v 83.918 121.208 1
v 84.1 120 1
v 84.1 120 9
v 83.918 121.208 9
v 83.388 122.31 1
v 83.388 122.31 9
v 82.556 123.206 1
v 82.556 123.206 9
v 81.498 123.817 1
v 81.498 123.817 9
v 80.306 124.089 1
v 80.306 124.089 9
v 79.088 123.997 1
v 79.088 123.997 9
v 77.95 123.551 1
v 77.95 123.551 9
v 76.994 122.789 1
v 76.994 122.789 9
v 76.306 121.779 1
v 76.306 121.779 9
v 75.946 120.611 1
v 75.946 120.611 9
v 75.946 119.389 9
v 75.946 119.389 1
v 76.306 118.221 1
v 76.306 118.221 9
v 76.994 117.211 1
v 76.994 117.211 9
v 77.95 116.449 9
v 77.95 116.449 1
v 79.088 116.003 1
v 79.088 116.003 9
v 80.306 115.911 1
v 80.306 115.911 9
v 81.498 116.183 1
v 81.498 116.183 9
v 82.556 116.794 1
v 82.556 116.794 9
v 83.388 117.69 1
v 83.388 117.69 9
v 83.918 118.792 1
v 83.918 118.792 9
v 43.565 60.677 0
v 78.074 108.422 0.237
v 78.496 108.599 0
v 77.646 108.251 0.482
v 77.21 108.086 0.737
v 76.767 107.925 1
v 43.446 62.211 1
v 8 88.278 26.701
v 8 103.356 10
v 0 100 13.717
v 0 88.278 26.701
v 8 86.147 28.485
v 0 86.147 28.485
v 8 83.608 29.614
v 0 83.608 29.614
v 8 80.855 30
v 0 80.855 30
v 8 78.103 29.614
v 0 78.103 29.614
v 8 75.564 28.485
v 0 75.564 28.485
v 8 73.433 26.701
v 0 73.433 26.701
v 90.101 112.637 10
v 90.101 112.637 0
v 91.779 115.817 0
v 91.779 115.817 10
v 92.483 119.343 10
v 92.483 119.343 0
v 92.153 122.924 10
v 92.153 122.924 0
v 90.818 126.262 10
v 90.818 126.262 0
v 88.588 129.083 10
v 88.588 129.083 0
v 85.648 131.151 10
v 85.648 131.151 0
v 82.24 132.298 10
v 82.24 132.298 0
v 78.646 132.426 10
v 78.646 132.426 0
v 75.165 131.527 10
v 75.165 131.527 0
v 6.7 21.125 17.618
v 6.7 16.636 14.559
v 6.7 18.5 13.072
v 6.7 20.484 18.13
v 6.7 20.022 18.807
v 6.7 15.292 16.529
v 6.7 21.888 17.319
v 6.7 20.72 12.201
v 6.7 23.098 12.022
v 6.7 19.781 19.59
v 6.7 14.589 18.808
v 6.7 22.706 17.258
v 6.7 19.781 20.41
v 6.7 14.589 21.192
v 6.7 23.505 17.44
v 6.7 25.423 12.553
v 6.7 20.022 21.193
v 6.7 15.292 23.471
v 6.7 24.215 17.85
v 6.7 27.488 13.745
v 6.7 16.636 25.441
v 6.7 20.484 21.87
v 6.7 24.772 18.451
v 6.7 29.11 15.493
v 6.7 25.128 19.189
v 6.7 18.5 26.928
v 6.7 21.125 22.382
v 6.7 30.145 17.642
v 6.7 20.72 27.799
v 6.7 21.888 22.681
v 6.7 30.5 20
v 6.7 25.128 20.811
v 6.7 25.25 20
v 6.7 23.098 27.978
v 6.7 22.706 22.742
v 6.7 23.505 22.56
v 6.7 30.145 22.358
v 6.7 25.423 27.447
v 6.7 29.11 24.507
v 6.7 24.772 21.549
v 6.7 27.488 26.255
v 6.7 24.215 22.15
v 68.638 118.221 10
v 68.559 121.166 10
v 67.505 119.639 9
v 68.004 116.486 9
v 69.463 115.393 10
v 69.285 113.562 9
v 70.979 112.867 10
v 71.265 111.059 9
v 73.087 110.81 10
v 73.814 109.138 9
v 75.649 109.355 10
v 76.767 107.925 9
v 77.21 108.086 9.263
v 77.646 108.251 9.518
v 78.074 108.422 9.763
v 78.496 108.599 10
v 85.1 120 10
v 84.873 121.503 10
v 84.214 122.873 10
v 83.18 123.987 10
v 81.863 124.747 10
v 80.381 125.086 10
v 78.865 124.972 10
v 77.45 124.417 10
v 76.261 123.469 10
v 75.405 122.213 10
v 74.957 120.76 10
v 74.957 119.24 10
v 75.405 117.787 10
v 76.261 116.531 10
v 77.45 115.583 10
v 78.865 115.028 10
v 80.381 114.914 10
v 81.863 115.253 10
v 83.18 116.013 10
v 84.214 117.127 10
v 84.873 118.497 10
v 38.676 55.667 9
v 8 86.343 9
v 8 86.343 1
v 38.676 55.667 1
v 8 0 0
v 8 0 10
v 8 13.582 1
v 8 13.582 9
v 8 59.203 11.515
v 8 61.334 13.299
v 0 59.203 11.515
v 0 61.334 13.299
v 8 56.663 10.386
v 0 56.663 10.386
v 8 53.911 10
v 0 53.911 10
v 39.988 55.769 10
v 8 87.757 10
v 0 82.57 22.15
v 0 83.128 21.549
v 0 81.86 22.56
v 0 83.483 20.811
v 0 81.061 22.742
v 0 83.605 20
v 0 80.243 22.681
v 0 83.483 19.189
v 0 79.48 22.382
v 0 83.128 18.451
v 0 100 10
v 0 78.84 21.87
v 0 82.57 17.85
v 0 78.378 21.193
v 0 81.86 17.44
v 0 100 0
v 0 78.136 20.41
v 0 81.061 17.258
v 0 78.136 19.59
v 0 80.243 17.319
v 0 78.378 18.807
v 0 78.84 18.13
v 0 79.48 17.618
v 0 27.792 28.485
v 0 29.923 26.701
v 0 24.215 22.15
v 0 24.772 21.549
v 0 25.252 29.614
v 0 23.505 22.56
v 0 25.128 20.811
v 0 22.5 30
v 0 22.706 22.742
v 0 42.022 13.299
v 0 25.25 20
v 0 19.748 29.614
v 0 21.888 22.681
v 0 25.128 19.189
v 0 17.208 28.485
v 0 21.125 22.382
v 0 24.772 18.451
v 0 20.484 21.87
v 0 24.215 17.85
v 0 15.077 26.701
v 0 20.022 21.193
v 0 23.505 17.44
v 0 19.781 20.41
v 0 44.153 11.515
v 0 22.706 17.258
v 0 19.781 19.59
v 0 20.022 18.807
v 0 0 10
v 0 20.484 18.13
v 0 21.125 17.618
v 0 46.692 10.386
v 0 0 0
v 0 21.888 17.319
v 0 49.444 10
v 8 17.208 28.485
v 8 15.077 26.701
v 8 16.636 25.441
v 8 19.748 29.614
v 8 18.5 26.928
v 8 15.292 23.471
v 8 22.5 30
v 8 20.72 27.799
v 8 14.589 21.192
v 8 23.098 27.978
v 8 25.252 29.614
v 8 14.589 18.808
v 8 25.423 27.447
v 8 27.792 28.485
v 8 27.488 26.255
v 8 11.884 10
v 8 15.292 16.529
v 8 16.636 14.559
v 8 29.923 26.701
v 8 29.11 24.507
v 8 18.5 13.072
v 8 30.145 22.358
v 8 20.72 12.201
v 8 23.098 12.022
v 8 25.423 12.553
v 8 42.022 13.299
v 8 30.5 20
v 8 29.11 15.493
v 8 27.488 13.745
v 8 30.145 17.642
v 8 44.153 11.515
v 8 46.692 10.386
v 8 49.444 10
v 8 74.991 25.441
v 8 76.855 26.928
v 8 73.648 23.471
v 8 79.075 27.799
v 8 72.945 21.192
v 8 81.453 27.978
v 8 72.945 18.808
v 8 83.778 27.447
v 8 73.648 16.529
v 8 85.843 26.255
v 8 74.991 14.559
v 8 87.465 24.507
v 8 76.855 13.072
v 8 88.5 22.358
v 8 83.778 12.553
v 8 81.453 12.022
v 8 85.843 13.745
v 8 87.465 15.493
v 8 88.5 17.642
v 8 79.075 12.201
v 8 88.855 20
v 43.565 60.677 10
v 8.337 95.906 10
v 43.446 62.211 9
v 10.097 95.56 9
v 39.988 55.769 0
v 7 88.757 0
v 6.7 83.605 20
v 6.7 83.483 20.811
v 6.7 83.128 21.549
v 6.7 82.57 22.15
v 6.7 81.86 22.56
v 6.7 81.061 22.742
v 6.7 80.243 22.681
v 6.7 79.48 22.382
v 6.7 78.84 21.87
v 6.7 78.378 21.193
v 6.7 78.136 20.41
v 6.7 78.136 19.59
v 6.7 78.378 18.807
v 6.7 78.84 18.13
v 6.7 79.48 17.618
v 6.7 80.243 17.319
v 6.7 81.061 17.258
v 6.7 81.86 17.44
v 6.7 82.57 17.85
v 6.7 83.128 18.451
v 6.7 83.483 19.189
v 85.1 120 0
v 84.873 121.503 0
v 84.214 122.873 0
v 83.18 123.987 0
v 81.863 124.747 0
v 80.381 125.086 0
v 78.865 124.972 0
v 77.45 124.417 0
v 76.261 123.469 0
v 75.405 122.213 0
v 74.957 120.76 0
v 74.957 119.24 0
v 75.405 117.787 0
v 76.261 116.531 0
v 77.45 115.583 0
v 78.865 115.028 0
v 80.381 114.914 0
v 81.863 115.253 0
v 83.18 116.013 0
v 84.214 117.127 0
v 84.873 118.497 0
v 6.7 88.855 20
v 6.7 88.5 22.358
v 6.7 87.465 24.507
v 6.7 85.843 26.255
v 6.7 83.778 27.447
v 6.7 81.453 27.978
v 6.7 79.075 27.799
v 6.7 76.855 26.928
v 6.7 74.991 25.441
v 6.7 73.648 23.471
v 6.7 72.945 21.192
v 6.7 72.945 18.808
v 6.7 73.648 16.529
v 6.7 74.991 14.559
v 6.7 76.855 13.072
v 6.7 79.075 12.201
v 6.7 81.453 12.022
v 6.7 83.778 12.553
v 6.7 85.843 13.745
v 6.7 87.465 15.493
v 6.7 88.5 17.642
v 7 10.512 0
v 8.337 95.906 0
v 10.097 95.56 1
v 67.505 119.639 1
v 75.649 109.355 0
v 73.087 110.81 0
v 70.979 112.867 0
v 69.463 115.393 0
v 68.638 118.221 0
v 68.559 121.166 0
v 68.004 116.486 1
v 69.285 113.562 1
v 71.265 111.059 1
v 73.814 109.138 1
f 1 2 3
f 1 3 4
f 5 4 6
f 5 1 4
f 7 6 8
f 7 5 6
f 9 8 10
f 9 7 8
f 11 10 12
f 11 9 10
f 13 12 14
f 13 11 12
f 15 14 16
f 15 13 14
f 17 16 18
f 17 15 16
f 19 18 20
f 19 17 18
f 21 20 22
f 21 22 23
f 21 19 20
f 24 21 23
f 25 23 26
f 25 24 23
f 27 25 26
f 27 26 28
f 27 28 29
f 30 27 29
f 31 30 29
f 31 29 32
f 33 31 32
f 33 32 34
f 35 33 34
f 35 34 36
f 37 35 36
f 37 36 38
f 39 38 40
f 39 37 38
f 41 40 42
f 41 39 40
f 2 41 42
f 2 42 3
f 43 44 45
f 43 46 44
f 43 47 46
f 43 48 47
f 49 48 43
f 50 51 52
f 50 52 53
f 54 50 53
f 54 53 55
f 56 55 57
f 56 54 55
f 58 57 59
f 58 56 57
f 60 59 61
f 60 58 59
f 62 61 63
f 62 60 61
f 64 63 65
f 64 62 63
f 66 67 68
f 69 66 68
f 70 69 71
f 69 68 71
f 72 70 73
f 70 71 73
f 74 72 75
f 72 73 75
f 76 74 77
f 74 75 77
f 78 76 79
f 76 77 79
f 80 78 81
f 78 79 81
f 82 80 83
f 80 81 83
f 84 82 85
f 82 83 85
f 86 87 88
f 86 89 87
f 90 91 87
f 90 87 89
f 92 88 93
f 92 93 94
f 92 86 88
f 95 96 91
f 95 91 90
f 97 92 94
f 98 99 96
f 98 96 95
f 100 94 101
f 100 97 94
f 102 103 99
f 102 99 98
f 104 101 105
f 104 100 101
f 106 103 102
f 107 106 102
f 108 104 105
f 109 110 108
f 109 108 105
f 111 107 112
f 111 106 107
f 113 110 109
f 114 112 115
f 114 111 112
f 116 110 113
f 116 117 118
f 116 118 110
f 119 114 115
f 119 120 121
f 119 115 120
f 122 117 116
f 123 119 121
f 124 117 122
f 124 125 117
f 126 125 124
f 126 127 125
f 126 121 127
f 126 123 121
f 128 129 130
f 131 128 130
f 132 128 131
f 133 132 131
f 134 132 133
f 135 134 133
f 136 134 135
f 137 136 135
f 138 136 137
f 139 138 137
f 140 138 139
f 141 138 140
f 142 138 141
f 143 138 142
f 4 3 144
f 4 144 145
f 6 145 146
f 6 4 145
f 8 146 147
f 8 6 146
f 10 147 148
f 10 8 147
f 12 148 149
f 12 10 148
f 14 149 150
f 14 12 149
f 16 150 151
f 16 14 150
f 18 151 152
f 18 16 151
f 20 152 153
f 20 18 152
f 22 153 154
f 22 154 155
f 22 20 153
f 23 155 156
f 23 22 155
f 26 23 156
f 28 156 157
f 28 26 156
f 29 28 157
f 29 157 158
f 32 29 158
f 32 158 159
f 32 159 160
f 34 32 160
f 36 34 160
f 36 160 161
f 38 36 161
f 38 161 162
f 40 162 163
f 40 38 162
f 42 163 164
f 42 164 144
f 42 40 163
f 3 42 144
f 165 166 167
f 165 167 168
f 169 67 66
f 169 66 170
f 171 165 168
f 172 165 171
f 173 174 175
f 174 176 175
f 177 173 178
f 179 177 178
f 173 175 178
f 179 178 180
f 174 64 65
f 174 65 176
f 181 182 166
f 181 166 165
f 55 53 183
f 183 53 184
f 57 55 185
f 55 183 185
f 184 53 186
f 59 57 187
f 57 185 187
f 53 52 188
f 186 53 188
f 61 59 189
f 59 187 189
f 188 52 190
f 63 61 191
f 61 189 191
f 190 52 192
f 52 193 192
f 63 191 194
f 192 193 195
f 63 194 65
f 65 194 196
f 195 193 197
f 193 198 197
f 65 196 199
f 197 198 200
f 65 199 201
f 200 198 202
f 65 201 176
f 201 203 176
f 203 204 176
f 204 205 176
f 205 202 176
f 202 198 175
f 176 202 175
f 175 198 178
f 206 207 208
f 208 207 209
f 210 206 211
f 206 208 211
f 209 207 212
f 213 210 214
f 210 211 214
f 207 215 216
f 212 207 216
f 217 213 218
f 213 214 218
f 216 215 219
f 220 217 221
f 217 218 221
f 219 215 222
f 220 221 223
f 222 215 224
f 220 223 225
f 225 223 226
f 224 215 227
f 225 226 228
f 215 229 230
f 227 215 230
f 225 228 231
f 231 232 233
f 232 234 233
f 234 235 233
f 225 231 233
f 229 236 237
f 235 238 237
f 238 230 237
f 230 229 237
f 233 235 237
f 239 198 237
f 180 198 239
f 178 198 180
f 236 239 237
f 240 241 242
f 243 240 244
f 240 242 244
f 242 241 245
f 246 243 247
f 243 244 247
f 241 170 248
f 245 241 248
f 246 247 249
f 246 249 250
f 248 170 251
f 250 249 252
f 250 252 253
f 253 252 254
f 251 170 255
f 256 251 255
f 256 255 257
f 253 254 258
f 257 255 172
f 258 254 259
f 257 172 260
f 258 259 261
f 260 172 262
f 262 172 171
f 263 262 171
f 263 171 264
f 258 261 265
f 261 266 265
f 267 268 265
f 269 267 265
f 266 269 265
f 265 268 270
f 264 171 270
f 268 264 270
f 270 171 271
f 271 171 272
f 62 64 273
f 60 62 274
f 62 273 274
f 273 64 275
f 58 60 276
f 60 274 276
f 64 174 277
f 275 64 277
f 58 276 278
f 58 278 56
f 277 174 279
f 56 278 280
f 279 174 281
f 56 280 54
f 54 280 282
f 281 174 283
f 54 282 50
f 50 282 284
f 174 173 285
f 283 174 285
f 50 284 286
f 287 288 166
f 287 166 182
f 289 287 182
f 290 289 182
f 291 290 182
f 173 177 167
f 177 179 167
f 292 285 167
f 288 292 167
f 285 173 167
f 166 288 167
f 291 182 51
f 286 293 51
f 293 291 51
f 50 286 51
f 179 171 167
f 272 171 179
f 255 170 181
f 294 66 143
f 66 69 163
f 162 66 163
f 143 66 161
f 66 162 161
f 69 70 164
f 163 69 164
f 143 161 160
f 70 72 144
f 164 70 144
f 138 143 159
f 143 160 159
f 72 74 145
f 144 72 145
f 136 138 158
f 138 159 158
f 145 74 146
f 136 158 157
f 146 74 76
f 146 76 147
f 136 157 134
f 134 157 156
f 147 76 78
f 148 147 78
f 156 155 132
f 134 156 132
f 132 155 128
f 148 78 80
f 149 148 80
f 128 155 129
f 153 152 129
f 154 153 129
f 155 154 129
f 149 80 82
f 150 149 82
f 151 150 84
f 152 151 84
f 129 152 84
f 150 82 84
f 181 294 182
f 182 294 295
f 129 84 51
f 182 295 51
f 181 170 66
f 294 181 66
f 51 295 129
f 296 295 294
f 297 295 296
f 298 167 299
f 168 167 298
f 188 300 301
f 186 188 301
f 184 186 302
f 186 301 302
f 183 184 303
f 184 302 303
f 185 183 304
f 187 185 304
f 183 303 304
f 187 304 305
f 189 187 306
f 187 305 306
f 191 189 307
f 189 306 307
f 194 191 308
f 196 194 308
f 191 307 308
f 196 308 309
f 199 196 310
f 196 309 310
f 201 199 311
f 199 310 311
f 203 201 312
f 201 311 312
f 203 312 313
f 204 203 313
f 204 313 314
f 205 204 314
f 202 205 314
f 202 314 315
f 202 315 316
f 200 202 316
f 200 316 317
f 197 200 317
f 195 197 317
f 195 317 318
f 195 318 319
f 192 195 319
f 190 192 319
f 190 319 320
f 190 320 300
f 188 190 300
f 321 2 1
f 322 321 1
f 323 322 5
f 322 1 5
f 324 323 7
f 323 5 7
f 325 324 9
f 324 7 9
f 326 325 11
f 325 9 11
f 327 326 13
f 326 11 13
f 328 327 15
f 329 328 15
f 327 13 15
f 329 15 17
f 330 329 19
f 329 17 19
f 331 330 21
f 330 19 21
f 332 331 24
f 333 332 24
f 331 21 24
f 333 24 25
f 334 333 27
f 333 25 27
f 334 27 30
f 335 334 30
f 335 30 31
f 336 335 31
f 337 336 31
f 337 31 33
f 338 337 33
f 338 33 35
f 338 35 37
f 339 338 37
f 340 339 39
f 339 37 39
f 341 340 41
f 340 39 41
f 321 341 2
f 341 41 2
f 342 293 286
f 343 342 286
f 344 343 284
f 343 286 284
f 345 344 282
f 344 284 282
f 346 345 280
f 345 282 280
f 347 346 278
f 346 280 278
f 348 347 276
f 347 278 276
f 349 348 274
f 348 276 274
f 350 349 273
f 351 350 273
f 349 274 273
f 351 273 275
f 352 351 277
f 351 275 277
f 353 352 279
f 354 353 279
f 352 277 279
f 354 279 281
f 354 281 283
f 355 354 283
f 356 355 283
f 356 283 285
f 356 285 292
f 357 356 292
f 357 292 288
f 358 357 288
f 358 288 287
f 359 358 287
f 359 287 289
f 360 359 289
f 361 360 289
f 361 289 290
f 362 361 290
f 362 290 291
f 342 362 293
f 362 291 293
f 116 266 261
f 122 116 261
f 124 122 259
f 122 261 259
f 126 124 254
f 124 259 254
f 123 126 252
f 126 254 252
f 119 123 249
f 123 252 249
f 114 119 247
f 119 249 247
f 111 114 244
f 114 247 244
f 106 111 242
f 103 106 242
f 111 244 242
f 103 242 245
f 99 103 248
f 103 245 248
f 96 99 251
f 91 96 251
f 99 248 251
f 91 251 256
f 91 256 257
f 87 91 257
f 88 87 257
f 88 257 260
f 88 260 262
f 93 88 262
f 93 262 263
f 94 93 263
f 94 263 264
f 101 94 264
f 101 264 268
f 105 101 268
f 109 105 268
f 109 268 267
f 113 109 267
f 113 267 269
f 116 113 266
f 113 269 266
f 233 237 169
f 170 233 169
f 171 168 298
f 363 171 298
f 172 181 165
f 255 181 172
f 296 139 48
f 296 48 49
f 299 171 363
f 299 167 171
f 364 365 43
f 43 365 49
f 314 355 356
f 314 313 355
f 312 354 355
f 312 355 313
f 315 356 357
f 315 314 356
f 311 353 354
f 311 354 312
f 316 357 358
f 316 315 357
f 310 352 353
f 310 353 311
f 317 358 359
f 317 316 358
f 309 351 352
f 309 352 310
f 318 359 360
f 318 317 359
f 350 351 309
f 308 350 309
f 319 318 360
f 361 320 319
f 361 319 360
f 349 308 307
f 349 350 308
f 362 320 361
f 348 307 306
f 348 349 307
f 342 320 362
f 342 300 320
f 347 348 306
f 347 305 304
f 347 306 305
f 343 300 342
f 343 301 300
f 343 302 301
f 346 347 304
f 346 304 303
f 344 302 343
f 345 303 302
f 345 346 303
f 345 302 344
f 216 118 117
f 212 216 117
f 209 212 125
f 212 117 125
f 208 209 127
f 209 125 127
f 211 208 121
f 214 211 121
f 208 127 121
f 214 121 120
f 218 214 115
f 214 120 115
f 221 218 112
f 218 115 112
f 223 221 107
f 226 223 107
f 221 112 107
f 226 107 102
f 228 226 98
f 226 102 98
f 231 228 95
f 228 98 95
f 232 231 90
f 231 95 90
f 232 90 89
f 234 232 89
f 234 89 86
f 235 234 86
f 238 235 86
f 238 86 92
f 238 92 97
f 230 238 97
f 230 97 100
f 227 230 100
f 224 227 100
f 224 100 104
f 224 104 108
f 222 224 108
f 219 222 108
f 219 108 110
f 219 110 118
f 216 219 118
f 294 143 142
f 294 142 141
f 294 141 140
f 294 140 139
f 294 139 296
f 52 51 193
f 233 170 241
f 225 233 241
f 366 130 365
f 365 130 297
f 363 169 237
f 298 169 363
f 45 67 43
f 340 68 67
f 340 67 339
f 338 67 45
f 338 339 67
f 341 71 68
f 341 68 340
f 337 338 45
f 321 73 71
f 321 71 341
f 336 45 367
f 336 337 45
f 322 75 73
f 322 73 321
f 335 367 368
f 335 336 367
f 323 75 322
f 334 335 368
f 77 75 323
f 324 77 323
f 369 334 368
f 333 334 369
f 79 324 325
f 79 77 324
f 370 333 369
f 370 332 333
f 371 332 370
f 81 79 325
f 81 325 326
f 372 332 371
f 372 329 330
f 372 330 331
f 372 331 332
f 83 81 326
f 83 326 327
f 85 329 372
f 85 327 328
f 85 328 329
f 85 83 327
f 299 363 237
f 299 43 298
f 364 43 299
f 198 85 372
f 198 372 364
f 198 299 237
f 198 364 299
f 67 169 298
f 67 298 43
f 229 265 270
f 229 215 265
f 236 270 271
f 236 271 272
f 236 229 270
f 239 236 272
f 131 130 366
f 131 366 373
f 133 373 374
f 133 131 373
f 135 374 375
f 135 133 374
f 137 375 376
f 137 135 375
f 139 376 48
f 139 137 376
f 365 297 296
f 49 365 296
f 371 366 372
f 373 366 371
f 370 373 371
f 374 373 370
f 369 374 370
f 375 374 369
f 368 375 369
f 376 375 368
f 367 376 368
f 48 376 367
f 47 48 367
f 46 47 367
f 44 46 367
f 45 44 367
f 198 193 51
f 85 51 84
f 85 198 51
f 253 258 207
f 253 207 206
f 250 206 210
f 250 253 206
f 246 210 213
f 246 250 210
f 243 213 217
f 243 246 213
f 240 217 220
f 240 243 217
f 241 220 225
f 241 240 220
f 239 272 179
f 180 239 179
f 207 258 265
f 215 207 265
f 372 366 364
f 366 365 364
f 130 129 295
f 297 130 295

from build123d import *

# Parameters (mm, degrees)
SKETCH_R        = 4.1
PAD_DEPTH       = 10
POCKET_DEPTH    = 10
PAD001_DEPTH    = 20
POCKET001_DEPTH = 10
CHAMFER_SIZE    = 1
CHAMFER001_SIZE = 1
SKETCH004_R     = 2.75
POCKET002_DEPTH = 8.001
SKETCH005_R     = 8
POCKET003_DEPTH = 1.3
FILLET_R        = 10


with BuildPart() as part:
    # Sketch → Pad (new body)
    with BuildSketch(Plane.XY):
        with BuildLine():
            Line((0, 0), (0, 100))
            Line((0, 100), (75.165103, 131.527089))
            ThreePointArc((90.101368, 112.637096), (89.805197, 127.752942), (75.165103, 131.527089))
            Line((90.101368, 112.637096), (8, 0))
            Line((8, 0), (0, 0))
        make_face()
        with Locations((80, 120)):
            Circle(SKETCH_R, mode=Mode.SUBTRACT)
    extrude(amount=PAD_DEPTH)

    # Sketch001 (on DatumPlane) → Pocket (cut)
    with BuildSketch(Plane.XY.offset(10)):
        Polygon((8, 13.581597), (8, 86.343146), (38.676131, 55.667014), align=None)
        with BuildLine():
            ThreePointArc((67.505213, 119.639023), (70.194803, 112.247058), (76.767254, 107.92526))
            Line((76.767254, 107.92526), (43.445969, 62.210885))
            Line((10.097006, 95.559849), (43.445969, 62.210885))
            Line((67.505213, 119.639023), (10.097006, 95.559849))
        make_face()
    extrude(amount=-POCKET_DEPTH, mode=Mode.SUBTRACT)

    # Sketch003 (on DatumPlane) → Pad001 (join)
    with BuildSketch(Plane.XY.offset(10)):
        Polygon((0, 100), (0, 0), (8, 0), (8, 103.355503), align=None)
    extrude(amount=PAD001_DEPTH)

    # Sketch002 (on DatumPlane) → Pocket001 (cut)
    with BuildSketch(Plane.YZ.offset(8)):
        with BuildLine():
            Line((0, 10), (15.077323, 26.70103))
            ThreePointArc((29.922685, 26.70103), (22.500004, 30), (15.077323, 26.70103))
            Line((29.922685, 26.70103), (45, 10))
            Line((45, 10), (58.355503, 10))
            Line((73.432722, 26.701024), (58.355503, 10))
            ThreePointArc((88.278096, 26.701024), (80.855409, 30), (73.432722, 26.701024))
            Line((103.355503, 10), (88.278096, 26.701024))
            Line((103.355503, 10), (128.355503, 10))
            Line((128.355503, 50), (128.355503, 10))
            Line((-25, 50), (128.355503, 50))
            Line((-25, 10), (-25, 50))
            Line((0, 10), (-25, 10))
        make_face()
    extrude(amount=-POCKET001_DEPTH, mode=Mode.SUBTRACT)

    # Chamfer
    chamfer_edges = [part.edges().sort_by_distance(p)[0] for p in [
        (75.9, 120, 10),
        (75.9, 120, 0),
    ]]
    chamfer(chamfer_edges, length=CHAMFER_SIZE)

    # Chamfer001
    chamfer001_edges = [part.edges().sort_by_distance(p)[0] for p in [
        (38.801109, 107.599436, 10),
        (70.194803, 112.247058, 10),
        (60.106612, 85.068072, 10),
        (26.771487, 78.885367, 10),
        (23.338066, 71.00508, 10),
        (23.338066, 34.624306, 10),
        (70.194803, 112.247058, 0),
        (60.106612, 85.068072, 0),
        (26.771487, 78.885367, 0),
        (38.801109, 107.599436, 0),
        (23.338066, 34.624306, 0),
        (8, 49.962371, 0),
        (23.338066, 71.00508, 0),
    ]]
    chamfer(chamfer001_edges, length=CHAMFER001_SIZE)

    # Sketch004 (on DatumPlane) → Pocket002 (cut, through all)
    with BuildSketch(Plane.YZ.offset(8)):
        with Locations((22.500004, 20)):
            Circle(SKETCH004_R)
        with Locations((80.855409, 20)):
            Circle(SKETCH004_R)
    extrude(amount=-POCKET002_DEPTH, mode=Mode.SUBTRACT)

    # Sketch005 (on DatumPlane) → Pocket003 (cut)
    with BuildSketch(Plane.YZ.offset(8)):
        with Locations((22.500004, 20)):
            Circle(SKETCH005_R)
        with Locations((80.855409, 20)):
            Circle(SKETCH005_R)
    extrude(amount=-POCKET003_DEPTH, mode=Mode.SUBTRACT)

    # Fillet
    fillet_edges = [part.edges().sort_by_distance(p)[0] for p in [
        (4, 58.355503, 10),
        (4, 45, 10),
    ]]
    fillet(fillet_edges, radius=FILLET_R)


solid = part.part
